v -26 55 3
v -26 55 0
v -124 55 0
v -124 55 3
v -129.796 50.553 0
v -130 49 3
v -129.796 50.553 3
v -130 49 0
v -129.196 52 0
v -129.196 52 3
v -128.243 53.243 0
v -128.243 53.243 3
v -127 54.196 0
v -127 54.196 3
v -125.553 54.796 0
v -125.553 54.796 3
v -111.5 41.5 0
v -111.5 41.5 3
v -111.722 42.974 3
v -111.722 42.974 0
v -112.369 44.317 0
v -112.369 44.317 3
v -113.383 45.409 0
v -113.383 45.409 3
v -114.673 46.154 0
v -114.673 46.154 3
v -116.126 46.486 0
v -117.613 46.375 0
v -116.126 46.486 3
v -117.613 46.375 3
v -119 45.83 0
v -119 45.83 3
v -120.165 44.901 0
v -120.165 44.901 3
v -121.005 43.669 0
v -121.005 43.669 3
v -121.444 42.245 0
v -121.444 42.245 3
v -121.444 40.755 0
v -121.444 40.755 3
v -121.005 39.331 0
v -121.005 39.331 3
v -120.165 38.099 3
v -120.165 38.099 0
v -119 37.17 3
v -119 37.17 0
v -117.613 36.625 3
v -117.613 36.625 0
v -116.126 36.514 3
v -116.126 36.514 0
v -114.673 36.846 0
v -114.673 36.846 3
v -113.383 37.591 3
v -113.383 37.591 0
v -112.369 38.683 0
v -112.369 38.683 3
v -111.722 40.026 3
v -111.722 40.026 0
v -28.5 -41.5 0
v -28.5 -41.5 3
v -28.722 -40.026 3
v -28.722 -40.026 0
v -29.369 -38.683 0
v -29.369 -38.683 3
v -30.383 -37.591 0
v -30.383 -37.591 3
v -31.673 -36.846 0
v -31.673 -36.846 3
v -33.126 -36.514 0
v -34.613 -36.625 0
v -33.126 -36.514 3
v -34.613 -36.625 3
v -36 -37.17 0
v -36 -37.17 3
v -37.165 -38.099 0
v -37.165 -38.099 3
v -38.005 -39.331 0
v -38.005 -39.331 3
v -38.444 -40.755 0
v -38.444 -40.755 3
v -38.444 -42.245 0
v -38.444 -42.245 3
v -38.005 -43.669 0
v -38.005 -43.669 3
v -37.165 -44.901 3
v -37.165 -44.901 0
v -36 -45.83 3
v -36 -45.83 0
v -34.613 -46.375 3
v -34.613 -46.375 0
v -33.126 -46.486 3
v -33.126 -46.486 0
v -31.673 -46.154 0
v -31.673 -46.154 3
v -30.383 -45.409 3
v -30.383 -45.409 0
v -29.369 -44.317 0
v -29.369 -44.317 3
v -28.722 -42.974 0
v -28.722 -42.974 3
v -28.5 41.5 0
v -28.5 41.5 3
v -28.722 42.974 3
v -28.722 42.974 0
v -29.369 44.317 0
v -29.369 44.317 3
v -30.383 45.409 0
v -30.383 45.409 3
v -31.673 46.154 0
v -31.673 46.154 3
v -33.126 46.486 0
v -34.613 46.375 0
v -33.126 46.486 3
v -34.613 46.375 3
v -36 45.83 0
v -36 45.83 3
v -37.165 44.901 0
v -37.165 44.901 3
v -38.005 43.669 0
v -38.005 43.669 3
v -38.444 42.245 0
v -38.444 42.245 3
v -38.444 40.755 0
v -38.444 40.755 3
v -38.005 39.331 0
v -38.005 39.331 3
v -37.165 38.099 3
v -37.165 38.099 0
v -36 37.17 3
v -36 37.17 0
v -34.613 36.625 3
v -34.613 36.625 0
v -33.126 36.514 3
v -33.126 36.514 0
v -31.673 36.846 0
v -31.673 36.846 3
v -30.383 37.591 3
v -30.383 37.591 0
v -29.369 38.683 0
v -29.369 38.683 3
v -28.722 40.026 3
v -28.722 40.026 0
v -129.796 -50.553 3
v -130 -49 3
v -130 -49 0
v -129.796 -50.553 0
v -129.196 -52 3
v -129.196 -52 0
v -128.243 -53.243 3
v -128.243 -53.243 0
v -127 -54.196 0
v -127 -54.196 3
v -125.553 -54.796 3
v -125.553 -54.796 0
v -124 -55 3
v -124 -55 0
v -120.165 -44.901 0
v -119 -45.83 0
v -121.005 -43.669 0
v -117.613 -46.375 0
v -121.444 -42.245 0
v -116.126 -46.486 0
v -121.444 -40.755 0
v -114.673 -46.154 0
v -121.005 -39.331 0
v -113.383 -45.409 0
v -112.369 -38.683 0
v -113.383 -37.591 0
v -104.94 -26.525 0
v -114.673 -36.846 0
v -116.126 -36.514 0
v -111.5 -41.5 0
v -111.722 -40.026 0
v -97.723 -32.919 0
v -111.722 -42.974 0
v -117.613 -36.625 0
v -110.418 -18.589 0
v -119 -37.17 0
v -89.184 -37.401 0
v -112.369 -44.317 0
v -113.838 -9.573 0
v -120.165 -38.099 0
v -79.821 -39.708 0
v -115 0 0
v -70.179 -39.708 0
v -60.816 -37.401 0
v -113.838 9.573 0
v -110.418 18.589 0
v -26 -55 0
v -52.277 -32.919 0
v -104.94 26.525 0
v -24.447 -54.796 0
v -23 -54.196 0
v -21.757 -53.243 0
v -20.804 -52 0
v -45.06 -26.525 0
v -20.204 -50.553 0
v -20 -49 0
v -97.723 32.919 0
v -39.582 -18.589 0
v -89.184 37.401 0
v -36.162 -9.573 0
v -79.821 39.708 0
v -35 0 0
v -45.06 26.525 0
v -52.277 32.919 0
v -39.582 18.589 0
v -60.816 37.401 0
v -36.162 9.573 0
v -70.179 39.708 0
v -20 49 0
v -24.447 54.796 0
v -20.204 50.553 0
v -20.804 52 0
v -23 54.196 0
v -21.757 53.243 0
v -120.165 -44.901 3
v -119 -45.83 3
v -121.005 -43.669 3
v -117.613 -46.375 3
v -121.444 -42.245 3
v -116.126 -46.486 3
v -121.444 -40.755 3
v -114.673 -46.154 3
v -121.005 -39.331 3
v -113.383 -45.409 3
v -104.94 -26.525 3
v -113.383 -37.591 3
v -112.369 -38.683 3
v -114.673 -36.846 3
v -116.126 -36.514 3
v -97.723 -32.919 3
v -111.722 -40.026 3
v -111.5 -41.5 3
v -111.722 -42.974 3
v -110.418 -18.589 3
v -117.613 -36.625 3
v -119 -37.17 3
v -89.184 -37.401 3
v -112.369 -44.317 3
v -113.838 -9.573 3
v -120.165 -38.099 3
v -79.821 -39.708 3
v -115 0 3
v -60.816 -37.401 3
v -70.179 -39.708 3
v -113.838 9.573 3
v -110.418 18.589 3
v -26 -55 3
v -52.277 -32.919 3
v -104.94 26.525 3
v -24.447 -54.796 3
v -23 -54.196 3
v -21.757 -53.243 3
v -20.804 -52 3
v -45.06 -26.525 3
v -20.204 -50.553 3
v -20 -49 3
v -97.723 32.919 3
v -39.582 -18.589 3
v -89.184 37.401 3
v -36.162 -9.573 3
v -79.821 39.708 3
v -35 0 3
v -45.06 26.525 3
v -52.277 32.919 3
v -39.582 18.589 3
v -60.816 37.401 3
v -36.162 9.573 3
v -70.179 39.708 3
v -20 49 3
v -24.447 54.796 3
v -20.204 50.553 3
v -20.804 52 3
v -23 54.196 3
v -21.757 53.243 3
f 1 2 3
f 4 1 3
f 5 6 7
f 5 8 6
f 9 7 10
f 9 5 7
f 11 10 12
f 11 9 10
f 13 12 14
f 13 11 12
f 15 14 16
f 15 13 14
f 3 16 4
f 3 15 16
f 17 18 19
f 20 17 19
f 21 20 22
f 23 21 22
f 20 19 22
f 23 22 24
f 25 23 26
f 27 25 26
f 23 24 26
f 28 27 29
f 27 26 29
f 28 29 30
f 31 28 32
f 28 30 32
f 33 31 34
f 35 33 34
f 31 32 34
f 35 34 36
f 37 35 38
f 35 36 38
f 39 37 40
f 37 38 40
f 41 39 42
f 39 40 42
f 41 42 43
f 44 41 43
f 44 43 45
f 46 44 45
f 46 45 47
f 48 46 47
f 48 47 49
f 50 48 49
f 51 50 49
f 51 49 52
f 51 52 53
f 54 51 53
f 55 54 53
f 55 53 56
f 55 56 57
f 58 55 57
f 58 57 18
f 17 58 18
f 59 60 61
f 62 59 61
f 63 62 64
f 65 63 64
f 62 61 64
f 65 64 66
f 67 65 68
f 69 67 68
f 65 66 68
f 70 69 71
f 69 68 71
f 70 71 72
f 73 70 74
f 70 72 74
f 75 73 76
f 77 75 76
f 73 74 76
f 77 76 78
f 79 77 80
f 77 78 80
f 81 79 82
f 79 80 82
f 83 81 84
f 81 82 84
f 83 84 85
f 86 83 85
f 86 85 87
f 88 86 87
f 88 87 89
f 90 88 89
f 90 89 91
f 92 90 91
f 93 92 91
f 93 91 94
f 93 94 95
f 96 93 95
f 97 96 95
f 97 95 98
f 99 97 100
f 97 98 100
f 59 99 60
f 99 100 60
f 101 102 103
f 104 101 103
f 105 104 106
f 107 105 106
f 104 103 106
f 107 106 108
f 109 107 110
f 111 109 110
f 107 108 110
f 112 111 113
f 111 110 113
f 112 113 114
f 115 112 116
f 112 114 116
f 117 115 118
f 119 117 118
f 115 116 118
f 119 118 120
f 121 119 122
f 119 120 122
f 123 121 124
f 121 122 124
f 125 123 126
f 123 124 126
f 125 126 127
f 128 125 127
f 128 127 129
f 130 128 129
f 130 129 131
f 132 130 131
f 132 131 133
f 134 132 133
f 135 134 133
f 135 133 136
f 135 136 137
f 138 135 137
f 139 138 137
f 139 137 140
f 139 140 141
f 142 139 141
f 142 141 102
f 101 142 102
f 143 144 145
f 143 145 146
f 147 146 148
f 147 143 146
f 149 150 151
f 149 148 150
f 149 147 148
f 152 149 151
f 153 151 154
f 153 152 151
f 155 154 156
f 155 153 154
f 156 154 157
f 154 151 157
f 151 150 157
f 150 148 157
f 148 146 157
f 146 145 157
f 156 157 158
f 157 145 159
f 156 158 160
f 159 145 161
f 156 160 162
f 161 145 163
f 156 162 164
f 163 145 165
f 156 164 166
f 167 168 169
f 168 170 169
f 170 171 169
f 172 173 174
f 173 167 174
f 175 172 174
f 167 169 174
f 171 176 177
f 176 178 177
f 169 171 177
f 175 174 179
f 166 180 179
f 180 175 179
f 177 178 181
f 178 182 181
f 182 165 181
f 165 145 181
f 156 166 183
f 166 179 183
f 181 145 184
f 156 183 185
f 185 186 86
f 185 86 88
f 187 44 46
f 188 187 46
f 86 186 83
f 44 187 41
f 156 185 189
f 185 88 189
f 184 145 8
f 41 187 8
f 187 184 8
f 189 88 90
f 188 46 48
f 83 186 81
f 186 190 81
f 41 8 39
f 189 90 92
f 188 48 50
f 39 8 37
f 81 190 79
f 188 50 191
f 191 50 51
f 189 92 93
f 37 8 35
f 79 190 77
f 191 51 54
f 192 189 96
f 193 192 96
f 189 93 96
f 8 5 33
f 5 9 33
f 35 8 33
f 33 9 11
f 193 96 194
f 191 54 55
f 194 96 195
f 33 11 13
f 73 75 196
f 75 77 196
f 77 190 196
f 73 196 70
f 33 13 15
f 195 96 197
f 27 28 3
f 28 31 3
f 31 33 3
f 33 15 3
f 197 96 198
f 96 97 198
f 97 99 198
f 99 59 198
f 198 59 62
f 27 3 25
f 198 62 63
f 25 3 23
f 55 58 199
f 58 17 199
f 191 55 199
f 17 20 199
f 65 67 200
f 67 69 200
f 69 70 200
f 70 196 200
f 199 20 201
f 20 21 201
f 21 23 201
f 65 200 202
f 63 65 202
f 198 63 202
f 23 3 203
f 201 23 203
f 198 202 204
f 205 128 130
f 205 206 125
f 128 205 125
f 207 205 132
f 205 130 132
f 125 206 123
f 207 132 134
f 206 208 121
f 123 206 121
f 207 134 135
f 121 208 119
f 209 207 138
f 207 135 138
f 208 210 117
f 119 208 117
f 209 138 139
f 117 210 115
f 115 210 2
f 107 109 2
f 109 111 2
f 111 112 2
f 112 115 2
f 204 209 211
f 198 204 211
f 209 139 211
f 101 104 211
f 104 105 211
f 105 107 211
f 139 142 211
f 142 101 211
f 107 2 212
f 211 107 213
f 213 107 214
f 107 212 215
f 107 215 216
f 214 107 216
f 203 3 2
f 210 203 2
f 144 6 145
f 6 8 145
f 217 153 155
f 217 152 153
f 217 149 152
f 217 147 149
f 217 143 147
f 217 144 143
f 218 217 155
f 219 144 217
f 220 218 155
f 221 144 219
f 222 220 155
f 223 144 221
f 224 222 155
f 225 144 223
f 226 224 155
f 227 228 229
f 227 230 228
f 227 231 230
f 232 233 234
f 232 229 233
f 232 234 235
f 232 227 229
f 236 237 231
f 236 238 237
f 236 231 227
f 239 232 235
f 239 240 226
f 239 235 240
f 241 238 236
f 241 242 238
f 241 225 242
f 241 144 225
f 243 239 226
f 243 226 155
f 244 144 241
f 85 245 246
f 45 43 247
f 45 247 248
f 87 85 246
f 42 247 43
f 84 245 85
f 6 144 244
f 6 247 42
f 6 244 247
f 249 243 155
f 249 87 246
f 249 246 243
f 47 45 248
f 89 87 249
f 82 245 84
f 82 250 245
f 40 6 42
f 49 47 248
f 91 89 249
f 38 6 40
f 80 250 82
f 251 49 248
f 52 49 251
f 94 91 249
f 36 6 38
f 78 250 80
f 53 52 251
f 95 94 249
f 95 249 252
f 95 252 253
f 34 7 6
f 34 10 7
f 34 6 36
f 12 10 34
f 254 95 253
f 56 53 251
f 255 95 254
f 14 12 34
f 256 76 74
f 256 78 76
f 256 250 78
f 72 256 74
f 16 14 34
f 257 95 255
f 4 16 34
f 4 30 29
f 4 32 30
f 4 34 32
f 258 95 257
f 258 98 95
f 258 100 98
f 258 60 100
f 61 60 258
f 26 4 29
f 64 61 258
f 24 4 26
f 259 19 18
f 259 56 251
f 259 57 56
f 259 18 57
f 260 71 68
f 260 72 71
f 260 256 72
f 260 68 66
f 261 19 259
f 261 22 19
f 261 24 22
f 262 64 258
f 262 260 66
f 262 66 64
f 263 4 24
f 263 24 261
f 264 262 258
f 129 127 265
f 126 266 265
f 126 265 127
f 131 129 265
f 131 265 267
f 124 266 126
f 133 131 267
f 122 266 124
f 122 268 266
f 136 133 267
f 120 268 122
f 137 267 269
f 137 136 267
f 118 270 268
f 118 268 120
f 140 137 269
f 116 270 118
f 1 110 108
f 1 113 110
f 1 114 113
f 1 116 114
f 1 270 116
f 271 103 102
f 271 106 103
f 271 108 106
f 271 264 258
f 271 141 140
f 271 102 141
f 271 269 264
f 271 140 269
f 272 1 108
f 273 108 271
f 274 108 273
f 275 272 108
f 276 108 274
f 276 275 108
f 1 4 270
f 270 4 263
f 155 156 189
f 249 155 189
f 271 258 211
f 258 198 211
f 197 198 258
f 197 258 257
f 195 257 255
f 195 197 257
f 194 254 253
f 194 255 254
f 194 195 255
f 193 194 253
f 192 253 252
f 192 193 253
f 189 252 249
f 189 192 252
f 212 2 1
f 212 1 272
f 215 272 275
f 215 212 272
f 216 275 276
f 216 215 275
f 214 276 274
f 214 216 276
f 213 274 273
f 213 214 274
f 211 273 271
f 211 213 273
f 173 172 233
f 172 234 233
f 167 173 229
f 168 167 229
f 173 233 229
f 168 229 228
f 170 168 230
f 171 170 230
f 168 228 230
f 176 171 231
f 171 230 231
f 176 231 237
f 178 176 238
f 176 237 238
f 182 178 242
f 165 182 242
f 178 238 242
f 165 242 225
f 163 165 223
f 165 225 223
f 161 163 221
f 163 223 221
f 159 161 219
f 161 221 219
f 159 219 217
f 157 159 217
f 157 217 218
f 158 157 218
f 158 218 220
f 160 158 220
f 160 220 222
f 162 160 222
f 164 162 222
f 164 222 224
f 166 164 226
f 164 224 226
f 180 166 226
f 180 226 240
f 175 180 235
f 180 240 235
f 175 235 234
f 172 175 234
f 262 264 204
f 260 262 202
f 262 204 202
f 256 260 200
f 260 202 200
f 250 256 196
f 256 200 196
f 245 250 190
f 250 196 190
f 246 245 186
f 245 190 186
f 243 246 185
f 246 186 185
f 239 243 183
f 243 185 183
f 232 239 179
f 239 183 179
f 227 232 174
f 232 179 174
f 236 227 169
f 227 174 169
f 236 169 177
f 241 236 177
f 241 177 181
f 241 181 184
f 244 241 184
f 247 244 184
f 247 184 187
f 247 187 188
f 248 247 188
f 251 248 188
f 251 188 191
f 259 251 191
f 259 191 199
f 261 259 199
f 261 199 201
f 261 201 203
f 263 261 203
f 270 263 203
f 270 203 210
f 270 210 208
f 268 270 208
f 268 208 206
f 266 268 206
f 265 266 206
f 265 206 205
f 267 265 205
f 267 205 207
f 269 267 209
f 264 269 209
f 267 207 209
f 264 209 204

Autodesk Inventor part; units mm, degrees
ref_plane "YZ Plane" through (0, 0, 0) normal (1, 0, 0) x (0, 1, 0)
ref_plane "XZ Plane" through (0, 0, 0) normal (0, 1, 0) x (-1, 0, 0)
ref_plane "XY Plane" through (0, 0, 0) normal (0, 0, 1) x (1, 0, 0)
sketch "Sketch1" plane through (0, 0, 0) normal (0, 0, 1) x (1, 0, 0)
  line L0 (-200, 100) -> (200, 100)
  line L1 (200, 100) -> (200, -100)
  line L2 (200, -100) -> (-200, -100)
  line L3 (-200, -100) -> (-200, 100)
  line L4 (-200, 100) -> (200, -100) construction
  line L5 (200, 100) -> (-200, -100) construction
  point P0 (0, 0)
  point P1 (0, 0)
  point P2 (0, 0)
  dimension "d25" = 400
  dimension "d26" = 200
extrude "Plate1" add sketch "Sketch1" along normal blind 3
sketch "Sketch5" plane through (-197, -100, 0) normal (-1, 0, 0) x (0, -1, 0)
  line L0 (-200, 0) -> (0, 0)
  line L1 (0, 0) -> (0, 50)
  line L2 (0, 50) -> (-200, 50)
  line L3 (-200, 50) -> (-200, 0)
edge flange "Flange2" height 50 angle 90 thickness 3 bend radius 5 thickness toward (-1, 0, 0) relief round relief width 3 relief depth 1.5 corner gap 5 corner form 0 edges at (-200, 0, 3) (200, 0, 3) (0, 100, 3) (0, -100, 3) wall of the first edge with corners at (-197, 100, 0) (-197, -100, 0) (-197, -100, 50) (-197, 100, 50)
bend "Bend2"
corner "Corner2"
sketch "Sketch6" plane through (0, 0, 3) normal (0, 0, 1) x (1, 0, 0)
  circle A0 centre (-75, 0) radius 16
  circle A1 centre (75, 0) radius 16
  line L0 (0, 0) -> (0, 55.0725) construction
  circle A2 centre (33.5, 41.5) radius 5
  circle A3 centre (116.5, 41.5) radius 5
  circle A4 centre (116.5, -41.5) radius 5
  circle A5 centre (33.5, -41.5) radius 5
  line L1 (75, 0) -> (-75, 0)
  line L2 (75, 0) -> (75, -40.8866)
  circle A6 centre (-33.5, 41.5) radius 5
  circle A7 centre (-116.5, 41.5) radius 5
  circle A8 centre (-116.5, -41.5) radius 5
  circle A9 centre (-33.5, -41.5) radius 5
  point P0 (-75, -40.8866)
  dimension "d37" = 32
  dimension "d38" = 150
  dimension "d55" = 10
  dimension "d56" = 83
  dimension "d57" = 83
extrude "Cut1" cut sketch "Sketch6" against normal blind 3
sketch "Sketch7" plane through (-196.2929, 100, 8) normal (0, 1, 0) x (1, 0, 0)
  circle A0 centre (196.2929, -20) radius 6.5
  line L0 (5, 5) -> (387.5858, 5) projected
  line L1 (387.5858, 5) -> (388.2929, 5) projected
  line L2 (388.2929, 5) -> (387.5858, 5) projected
  line L3 (387.5858, 5) -> (5, 5) projected
  line L4 (5, 5) -> (4.2929, 5) projected
  line L5 (4.2929, 5) -> (5, 5) projected
  point P0 (196.2929, 8)
  dimension "d41" = 13
  dimension "d42" = 25
extrude "Extrusion2" cut sketch "Sketch7" against normal through all
pattern_linear "Rectangular Pattern1" count 3 spacing 162 along (-1, 0, 0) of "Extrusion2" first direction both ways yes
sketch "Sketch8" plane through (0, 0, 0) normal (1, 0, 0) x (0, 1, 0)
  line L0 (-96.2929, 50) -> (96.2929, 50) projected
  circle A0 centre (0, 28) radius 6.5
  line L1 (91.2929, 3) -> (-91.2929, 3) projected
  point P0 (0, 0)
  dimension "d48" = 13
  dimension "d49" = 25
extrude "Extrusion3" cut sketch "Sketch8" along normal through all both and the other way through all
pattern_linear "Rectangular Pattern2" count 3 spacing 72 along (0, 1, 0) of "Extrusion3" first direction both ways yes
sketch "Sketch9" plane through (0, 0, 0) normal (0, 0, 1) x (1, 0, 0)
  line L0 (-233.1694, -164.5287) -> (298.5547, -164.5287)
  line L1 (298.5547, -164.5287) -> (298.5547, 258.31)
  line L2 (298.5547, 258.31) -> (-233.1694, 258.31)
  line L3 (-233.1694, 258.31) -> (-233.1694, -164.5287)
  circle A0 centre (-75, 0) radius 16 projected
  line L4 (-130, -55) -> (-20, -55)
  line L5 (-20, -55) -> (-20, 55)
  line L6 (-20, 55) -> (-130, 55)
  line L7 (-130, 55) -> (-130, -55)
  line L8 (-130, -55) -> (-20, 55) construction
  line L9 (-20, -55) -> (-130, 55) construction
  circle A1 centre (-75, 0) radius 40
  point P0 (0, 0)
  dimension "d58" = 110
  dimension "d59" = 110
  dimension "d60" = 80
extrude "Extrusion4" cut sketch "Sketch9" along normal through all both and the other way through all
fillet "Corner Round1" radius 6 4 edges at (-130, -55, 1.5) (-130, 55, 1.5) (-20, 55, 1.5) (-20, -55, 1.5)
equation "\"d25\" = Гриндер_проходная_ширина + 2 * Гриндер_размер_фланца"
equation "\"d26\" = Гриндер_высота"
equation "\"d38\" = Гриндер_Валы_между_центрами"
equation "\"d57\" = d56"
equation "\"d39\" = Thickness"
equation "\"d41\" = Гриндер_диам_отврс_корпуса"
equation "\"d42\" = Гриндер_отступ_отврс_корпуса"
equation "\"d48\" = Гриндер_диам_отврс_корпуса"
equation "\"d49\" = Гриндер_отступ_отврс_корпуса"
equation "\"d2\" = Thickness"
equation "\"d27\" = BendReliefWidth"
equation "\"d28\" = BendReliefDepth"
equation "\"d29\" = MinimumRemnant"
equation "\"d30\" = TransitionRadius"
equation "\"d33\" = BendRadius"
equation "\"d34\" = CornerReliefSize"
equation "\"d36\" = JacobiRadiusSize"
equation "\"BendReliefWidth\" = Thickness"
equation "\"BendReliefDepth\" = 0.5 * Thickness"
equation "\"CornerReliefSize\" = 4 * Thickness"
equation "\"MinimumRemnant\" = 2 * Thickness"
equation "\"TransitionRadius\" = BendRadius"
equation "\"JacobiRadiusSize\" = BendRadius"
equation "\"GapSize\" = Thickness"
equation "\"Гриндер_отступ_отврс_корпуса\" = 25"
equation "\"Гриндер_диам_отврс_корпуса\" = 13"
equation "\"Гриндер_проходная_ширина\" = 320"
equation "\"Гриндер_проходная_длина\" = 320"
equation "\"Гриндер_высота\" = 200"
equation "\"Гриндер_размер_фланца\" = 40"
equation "\"Гриндер_Валы_между_центрами\" = 150"
equation "\"Thickness\" = 3"
equation "\"BendRadius\" = 5"
properties part number "NDM-VOS 161 harrow plate" material "Stainless Steel"
